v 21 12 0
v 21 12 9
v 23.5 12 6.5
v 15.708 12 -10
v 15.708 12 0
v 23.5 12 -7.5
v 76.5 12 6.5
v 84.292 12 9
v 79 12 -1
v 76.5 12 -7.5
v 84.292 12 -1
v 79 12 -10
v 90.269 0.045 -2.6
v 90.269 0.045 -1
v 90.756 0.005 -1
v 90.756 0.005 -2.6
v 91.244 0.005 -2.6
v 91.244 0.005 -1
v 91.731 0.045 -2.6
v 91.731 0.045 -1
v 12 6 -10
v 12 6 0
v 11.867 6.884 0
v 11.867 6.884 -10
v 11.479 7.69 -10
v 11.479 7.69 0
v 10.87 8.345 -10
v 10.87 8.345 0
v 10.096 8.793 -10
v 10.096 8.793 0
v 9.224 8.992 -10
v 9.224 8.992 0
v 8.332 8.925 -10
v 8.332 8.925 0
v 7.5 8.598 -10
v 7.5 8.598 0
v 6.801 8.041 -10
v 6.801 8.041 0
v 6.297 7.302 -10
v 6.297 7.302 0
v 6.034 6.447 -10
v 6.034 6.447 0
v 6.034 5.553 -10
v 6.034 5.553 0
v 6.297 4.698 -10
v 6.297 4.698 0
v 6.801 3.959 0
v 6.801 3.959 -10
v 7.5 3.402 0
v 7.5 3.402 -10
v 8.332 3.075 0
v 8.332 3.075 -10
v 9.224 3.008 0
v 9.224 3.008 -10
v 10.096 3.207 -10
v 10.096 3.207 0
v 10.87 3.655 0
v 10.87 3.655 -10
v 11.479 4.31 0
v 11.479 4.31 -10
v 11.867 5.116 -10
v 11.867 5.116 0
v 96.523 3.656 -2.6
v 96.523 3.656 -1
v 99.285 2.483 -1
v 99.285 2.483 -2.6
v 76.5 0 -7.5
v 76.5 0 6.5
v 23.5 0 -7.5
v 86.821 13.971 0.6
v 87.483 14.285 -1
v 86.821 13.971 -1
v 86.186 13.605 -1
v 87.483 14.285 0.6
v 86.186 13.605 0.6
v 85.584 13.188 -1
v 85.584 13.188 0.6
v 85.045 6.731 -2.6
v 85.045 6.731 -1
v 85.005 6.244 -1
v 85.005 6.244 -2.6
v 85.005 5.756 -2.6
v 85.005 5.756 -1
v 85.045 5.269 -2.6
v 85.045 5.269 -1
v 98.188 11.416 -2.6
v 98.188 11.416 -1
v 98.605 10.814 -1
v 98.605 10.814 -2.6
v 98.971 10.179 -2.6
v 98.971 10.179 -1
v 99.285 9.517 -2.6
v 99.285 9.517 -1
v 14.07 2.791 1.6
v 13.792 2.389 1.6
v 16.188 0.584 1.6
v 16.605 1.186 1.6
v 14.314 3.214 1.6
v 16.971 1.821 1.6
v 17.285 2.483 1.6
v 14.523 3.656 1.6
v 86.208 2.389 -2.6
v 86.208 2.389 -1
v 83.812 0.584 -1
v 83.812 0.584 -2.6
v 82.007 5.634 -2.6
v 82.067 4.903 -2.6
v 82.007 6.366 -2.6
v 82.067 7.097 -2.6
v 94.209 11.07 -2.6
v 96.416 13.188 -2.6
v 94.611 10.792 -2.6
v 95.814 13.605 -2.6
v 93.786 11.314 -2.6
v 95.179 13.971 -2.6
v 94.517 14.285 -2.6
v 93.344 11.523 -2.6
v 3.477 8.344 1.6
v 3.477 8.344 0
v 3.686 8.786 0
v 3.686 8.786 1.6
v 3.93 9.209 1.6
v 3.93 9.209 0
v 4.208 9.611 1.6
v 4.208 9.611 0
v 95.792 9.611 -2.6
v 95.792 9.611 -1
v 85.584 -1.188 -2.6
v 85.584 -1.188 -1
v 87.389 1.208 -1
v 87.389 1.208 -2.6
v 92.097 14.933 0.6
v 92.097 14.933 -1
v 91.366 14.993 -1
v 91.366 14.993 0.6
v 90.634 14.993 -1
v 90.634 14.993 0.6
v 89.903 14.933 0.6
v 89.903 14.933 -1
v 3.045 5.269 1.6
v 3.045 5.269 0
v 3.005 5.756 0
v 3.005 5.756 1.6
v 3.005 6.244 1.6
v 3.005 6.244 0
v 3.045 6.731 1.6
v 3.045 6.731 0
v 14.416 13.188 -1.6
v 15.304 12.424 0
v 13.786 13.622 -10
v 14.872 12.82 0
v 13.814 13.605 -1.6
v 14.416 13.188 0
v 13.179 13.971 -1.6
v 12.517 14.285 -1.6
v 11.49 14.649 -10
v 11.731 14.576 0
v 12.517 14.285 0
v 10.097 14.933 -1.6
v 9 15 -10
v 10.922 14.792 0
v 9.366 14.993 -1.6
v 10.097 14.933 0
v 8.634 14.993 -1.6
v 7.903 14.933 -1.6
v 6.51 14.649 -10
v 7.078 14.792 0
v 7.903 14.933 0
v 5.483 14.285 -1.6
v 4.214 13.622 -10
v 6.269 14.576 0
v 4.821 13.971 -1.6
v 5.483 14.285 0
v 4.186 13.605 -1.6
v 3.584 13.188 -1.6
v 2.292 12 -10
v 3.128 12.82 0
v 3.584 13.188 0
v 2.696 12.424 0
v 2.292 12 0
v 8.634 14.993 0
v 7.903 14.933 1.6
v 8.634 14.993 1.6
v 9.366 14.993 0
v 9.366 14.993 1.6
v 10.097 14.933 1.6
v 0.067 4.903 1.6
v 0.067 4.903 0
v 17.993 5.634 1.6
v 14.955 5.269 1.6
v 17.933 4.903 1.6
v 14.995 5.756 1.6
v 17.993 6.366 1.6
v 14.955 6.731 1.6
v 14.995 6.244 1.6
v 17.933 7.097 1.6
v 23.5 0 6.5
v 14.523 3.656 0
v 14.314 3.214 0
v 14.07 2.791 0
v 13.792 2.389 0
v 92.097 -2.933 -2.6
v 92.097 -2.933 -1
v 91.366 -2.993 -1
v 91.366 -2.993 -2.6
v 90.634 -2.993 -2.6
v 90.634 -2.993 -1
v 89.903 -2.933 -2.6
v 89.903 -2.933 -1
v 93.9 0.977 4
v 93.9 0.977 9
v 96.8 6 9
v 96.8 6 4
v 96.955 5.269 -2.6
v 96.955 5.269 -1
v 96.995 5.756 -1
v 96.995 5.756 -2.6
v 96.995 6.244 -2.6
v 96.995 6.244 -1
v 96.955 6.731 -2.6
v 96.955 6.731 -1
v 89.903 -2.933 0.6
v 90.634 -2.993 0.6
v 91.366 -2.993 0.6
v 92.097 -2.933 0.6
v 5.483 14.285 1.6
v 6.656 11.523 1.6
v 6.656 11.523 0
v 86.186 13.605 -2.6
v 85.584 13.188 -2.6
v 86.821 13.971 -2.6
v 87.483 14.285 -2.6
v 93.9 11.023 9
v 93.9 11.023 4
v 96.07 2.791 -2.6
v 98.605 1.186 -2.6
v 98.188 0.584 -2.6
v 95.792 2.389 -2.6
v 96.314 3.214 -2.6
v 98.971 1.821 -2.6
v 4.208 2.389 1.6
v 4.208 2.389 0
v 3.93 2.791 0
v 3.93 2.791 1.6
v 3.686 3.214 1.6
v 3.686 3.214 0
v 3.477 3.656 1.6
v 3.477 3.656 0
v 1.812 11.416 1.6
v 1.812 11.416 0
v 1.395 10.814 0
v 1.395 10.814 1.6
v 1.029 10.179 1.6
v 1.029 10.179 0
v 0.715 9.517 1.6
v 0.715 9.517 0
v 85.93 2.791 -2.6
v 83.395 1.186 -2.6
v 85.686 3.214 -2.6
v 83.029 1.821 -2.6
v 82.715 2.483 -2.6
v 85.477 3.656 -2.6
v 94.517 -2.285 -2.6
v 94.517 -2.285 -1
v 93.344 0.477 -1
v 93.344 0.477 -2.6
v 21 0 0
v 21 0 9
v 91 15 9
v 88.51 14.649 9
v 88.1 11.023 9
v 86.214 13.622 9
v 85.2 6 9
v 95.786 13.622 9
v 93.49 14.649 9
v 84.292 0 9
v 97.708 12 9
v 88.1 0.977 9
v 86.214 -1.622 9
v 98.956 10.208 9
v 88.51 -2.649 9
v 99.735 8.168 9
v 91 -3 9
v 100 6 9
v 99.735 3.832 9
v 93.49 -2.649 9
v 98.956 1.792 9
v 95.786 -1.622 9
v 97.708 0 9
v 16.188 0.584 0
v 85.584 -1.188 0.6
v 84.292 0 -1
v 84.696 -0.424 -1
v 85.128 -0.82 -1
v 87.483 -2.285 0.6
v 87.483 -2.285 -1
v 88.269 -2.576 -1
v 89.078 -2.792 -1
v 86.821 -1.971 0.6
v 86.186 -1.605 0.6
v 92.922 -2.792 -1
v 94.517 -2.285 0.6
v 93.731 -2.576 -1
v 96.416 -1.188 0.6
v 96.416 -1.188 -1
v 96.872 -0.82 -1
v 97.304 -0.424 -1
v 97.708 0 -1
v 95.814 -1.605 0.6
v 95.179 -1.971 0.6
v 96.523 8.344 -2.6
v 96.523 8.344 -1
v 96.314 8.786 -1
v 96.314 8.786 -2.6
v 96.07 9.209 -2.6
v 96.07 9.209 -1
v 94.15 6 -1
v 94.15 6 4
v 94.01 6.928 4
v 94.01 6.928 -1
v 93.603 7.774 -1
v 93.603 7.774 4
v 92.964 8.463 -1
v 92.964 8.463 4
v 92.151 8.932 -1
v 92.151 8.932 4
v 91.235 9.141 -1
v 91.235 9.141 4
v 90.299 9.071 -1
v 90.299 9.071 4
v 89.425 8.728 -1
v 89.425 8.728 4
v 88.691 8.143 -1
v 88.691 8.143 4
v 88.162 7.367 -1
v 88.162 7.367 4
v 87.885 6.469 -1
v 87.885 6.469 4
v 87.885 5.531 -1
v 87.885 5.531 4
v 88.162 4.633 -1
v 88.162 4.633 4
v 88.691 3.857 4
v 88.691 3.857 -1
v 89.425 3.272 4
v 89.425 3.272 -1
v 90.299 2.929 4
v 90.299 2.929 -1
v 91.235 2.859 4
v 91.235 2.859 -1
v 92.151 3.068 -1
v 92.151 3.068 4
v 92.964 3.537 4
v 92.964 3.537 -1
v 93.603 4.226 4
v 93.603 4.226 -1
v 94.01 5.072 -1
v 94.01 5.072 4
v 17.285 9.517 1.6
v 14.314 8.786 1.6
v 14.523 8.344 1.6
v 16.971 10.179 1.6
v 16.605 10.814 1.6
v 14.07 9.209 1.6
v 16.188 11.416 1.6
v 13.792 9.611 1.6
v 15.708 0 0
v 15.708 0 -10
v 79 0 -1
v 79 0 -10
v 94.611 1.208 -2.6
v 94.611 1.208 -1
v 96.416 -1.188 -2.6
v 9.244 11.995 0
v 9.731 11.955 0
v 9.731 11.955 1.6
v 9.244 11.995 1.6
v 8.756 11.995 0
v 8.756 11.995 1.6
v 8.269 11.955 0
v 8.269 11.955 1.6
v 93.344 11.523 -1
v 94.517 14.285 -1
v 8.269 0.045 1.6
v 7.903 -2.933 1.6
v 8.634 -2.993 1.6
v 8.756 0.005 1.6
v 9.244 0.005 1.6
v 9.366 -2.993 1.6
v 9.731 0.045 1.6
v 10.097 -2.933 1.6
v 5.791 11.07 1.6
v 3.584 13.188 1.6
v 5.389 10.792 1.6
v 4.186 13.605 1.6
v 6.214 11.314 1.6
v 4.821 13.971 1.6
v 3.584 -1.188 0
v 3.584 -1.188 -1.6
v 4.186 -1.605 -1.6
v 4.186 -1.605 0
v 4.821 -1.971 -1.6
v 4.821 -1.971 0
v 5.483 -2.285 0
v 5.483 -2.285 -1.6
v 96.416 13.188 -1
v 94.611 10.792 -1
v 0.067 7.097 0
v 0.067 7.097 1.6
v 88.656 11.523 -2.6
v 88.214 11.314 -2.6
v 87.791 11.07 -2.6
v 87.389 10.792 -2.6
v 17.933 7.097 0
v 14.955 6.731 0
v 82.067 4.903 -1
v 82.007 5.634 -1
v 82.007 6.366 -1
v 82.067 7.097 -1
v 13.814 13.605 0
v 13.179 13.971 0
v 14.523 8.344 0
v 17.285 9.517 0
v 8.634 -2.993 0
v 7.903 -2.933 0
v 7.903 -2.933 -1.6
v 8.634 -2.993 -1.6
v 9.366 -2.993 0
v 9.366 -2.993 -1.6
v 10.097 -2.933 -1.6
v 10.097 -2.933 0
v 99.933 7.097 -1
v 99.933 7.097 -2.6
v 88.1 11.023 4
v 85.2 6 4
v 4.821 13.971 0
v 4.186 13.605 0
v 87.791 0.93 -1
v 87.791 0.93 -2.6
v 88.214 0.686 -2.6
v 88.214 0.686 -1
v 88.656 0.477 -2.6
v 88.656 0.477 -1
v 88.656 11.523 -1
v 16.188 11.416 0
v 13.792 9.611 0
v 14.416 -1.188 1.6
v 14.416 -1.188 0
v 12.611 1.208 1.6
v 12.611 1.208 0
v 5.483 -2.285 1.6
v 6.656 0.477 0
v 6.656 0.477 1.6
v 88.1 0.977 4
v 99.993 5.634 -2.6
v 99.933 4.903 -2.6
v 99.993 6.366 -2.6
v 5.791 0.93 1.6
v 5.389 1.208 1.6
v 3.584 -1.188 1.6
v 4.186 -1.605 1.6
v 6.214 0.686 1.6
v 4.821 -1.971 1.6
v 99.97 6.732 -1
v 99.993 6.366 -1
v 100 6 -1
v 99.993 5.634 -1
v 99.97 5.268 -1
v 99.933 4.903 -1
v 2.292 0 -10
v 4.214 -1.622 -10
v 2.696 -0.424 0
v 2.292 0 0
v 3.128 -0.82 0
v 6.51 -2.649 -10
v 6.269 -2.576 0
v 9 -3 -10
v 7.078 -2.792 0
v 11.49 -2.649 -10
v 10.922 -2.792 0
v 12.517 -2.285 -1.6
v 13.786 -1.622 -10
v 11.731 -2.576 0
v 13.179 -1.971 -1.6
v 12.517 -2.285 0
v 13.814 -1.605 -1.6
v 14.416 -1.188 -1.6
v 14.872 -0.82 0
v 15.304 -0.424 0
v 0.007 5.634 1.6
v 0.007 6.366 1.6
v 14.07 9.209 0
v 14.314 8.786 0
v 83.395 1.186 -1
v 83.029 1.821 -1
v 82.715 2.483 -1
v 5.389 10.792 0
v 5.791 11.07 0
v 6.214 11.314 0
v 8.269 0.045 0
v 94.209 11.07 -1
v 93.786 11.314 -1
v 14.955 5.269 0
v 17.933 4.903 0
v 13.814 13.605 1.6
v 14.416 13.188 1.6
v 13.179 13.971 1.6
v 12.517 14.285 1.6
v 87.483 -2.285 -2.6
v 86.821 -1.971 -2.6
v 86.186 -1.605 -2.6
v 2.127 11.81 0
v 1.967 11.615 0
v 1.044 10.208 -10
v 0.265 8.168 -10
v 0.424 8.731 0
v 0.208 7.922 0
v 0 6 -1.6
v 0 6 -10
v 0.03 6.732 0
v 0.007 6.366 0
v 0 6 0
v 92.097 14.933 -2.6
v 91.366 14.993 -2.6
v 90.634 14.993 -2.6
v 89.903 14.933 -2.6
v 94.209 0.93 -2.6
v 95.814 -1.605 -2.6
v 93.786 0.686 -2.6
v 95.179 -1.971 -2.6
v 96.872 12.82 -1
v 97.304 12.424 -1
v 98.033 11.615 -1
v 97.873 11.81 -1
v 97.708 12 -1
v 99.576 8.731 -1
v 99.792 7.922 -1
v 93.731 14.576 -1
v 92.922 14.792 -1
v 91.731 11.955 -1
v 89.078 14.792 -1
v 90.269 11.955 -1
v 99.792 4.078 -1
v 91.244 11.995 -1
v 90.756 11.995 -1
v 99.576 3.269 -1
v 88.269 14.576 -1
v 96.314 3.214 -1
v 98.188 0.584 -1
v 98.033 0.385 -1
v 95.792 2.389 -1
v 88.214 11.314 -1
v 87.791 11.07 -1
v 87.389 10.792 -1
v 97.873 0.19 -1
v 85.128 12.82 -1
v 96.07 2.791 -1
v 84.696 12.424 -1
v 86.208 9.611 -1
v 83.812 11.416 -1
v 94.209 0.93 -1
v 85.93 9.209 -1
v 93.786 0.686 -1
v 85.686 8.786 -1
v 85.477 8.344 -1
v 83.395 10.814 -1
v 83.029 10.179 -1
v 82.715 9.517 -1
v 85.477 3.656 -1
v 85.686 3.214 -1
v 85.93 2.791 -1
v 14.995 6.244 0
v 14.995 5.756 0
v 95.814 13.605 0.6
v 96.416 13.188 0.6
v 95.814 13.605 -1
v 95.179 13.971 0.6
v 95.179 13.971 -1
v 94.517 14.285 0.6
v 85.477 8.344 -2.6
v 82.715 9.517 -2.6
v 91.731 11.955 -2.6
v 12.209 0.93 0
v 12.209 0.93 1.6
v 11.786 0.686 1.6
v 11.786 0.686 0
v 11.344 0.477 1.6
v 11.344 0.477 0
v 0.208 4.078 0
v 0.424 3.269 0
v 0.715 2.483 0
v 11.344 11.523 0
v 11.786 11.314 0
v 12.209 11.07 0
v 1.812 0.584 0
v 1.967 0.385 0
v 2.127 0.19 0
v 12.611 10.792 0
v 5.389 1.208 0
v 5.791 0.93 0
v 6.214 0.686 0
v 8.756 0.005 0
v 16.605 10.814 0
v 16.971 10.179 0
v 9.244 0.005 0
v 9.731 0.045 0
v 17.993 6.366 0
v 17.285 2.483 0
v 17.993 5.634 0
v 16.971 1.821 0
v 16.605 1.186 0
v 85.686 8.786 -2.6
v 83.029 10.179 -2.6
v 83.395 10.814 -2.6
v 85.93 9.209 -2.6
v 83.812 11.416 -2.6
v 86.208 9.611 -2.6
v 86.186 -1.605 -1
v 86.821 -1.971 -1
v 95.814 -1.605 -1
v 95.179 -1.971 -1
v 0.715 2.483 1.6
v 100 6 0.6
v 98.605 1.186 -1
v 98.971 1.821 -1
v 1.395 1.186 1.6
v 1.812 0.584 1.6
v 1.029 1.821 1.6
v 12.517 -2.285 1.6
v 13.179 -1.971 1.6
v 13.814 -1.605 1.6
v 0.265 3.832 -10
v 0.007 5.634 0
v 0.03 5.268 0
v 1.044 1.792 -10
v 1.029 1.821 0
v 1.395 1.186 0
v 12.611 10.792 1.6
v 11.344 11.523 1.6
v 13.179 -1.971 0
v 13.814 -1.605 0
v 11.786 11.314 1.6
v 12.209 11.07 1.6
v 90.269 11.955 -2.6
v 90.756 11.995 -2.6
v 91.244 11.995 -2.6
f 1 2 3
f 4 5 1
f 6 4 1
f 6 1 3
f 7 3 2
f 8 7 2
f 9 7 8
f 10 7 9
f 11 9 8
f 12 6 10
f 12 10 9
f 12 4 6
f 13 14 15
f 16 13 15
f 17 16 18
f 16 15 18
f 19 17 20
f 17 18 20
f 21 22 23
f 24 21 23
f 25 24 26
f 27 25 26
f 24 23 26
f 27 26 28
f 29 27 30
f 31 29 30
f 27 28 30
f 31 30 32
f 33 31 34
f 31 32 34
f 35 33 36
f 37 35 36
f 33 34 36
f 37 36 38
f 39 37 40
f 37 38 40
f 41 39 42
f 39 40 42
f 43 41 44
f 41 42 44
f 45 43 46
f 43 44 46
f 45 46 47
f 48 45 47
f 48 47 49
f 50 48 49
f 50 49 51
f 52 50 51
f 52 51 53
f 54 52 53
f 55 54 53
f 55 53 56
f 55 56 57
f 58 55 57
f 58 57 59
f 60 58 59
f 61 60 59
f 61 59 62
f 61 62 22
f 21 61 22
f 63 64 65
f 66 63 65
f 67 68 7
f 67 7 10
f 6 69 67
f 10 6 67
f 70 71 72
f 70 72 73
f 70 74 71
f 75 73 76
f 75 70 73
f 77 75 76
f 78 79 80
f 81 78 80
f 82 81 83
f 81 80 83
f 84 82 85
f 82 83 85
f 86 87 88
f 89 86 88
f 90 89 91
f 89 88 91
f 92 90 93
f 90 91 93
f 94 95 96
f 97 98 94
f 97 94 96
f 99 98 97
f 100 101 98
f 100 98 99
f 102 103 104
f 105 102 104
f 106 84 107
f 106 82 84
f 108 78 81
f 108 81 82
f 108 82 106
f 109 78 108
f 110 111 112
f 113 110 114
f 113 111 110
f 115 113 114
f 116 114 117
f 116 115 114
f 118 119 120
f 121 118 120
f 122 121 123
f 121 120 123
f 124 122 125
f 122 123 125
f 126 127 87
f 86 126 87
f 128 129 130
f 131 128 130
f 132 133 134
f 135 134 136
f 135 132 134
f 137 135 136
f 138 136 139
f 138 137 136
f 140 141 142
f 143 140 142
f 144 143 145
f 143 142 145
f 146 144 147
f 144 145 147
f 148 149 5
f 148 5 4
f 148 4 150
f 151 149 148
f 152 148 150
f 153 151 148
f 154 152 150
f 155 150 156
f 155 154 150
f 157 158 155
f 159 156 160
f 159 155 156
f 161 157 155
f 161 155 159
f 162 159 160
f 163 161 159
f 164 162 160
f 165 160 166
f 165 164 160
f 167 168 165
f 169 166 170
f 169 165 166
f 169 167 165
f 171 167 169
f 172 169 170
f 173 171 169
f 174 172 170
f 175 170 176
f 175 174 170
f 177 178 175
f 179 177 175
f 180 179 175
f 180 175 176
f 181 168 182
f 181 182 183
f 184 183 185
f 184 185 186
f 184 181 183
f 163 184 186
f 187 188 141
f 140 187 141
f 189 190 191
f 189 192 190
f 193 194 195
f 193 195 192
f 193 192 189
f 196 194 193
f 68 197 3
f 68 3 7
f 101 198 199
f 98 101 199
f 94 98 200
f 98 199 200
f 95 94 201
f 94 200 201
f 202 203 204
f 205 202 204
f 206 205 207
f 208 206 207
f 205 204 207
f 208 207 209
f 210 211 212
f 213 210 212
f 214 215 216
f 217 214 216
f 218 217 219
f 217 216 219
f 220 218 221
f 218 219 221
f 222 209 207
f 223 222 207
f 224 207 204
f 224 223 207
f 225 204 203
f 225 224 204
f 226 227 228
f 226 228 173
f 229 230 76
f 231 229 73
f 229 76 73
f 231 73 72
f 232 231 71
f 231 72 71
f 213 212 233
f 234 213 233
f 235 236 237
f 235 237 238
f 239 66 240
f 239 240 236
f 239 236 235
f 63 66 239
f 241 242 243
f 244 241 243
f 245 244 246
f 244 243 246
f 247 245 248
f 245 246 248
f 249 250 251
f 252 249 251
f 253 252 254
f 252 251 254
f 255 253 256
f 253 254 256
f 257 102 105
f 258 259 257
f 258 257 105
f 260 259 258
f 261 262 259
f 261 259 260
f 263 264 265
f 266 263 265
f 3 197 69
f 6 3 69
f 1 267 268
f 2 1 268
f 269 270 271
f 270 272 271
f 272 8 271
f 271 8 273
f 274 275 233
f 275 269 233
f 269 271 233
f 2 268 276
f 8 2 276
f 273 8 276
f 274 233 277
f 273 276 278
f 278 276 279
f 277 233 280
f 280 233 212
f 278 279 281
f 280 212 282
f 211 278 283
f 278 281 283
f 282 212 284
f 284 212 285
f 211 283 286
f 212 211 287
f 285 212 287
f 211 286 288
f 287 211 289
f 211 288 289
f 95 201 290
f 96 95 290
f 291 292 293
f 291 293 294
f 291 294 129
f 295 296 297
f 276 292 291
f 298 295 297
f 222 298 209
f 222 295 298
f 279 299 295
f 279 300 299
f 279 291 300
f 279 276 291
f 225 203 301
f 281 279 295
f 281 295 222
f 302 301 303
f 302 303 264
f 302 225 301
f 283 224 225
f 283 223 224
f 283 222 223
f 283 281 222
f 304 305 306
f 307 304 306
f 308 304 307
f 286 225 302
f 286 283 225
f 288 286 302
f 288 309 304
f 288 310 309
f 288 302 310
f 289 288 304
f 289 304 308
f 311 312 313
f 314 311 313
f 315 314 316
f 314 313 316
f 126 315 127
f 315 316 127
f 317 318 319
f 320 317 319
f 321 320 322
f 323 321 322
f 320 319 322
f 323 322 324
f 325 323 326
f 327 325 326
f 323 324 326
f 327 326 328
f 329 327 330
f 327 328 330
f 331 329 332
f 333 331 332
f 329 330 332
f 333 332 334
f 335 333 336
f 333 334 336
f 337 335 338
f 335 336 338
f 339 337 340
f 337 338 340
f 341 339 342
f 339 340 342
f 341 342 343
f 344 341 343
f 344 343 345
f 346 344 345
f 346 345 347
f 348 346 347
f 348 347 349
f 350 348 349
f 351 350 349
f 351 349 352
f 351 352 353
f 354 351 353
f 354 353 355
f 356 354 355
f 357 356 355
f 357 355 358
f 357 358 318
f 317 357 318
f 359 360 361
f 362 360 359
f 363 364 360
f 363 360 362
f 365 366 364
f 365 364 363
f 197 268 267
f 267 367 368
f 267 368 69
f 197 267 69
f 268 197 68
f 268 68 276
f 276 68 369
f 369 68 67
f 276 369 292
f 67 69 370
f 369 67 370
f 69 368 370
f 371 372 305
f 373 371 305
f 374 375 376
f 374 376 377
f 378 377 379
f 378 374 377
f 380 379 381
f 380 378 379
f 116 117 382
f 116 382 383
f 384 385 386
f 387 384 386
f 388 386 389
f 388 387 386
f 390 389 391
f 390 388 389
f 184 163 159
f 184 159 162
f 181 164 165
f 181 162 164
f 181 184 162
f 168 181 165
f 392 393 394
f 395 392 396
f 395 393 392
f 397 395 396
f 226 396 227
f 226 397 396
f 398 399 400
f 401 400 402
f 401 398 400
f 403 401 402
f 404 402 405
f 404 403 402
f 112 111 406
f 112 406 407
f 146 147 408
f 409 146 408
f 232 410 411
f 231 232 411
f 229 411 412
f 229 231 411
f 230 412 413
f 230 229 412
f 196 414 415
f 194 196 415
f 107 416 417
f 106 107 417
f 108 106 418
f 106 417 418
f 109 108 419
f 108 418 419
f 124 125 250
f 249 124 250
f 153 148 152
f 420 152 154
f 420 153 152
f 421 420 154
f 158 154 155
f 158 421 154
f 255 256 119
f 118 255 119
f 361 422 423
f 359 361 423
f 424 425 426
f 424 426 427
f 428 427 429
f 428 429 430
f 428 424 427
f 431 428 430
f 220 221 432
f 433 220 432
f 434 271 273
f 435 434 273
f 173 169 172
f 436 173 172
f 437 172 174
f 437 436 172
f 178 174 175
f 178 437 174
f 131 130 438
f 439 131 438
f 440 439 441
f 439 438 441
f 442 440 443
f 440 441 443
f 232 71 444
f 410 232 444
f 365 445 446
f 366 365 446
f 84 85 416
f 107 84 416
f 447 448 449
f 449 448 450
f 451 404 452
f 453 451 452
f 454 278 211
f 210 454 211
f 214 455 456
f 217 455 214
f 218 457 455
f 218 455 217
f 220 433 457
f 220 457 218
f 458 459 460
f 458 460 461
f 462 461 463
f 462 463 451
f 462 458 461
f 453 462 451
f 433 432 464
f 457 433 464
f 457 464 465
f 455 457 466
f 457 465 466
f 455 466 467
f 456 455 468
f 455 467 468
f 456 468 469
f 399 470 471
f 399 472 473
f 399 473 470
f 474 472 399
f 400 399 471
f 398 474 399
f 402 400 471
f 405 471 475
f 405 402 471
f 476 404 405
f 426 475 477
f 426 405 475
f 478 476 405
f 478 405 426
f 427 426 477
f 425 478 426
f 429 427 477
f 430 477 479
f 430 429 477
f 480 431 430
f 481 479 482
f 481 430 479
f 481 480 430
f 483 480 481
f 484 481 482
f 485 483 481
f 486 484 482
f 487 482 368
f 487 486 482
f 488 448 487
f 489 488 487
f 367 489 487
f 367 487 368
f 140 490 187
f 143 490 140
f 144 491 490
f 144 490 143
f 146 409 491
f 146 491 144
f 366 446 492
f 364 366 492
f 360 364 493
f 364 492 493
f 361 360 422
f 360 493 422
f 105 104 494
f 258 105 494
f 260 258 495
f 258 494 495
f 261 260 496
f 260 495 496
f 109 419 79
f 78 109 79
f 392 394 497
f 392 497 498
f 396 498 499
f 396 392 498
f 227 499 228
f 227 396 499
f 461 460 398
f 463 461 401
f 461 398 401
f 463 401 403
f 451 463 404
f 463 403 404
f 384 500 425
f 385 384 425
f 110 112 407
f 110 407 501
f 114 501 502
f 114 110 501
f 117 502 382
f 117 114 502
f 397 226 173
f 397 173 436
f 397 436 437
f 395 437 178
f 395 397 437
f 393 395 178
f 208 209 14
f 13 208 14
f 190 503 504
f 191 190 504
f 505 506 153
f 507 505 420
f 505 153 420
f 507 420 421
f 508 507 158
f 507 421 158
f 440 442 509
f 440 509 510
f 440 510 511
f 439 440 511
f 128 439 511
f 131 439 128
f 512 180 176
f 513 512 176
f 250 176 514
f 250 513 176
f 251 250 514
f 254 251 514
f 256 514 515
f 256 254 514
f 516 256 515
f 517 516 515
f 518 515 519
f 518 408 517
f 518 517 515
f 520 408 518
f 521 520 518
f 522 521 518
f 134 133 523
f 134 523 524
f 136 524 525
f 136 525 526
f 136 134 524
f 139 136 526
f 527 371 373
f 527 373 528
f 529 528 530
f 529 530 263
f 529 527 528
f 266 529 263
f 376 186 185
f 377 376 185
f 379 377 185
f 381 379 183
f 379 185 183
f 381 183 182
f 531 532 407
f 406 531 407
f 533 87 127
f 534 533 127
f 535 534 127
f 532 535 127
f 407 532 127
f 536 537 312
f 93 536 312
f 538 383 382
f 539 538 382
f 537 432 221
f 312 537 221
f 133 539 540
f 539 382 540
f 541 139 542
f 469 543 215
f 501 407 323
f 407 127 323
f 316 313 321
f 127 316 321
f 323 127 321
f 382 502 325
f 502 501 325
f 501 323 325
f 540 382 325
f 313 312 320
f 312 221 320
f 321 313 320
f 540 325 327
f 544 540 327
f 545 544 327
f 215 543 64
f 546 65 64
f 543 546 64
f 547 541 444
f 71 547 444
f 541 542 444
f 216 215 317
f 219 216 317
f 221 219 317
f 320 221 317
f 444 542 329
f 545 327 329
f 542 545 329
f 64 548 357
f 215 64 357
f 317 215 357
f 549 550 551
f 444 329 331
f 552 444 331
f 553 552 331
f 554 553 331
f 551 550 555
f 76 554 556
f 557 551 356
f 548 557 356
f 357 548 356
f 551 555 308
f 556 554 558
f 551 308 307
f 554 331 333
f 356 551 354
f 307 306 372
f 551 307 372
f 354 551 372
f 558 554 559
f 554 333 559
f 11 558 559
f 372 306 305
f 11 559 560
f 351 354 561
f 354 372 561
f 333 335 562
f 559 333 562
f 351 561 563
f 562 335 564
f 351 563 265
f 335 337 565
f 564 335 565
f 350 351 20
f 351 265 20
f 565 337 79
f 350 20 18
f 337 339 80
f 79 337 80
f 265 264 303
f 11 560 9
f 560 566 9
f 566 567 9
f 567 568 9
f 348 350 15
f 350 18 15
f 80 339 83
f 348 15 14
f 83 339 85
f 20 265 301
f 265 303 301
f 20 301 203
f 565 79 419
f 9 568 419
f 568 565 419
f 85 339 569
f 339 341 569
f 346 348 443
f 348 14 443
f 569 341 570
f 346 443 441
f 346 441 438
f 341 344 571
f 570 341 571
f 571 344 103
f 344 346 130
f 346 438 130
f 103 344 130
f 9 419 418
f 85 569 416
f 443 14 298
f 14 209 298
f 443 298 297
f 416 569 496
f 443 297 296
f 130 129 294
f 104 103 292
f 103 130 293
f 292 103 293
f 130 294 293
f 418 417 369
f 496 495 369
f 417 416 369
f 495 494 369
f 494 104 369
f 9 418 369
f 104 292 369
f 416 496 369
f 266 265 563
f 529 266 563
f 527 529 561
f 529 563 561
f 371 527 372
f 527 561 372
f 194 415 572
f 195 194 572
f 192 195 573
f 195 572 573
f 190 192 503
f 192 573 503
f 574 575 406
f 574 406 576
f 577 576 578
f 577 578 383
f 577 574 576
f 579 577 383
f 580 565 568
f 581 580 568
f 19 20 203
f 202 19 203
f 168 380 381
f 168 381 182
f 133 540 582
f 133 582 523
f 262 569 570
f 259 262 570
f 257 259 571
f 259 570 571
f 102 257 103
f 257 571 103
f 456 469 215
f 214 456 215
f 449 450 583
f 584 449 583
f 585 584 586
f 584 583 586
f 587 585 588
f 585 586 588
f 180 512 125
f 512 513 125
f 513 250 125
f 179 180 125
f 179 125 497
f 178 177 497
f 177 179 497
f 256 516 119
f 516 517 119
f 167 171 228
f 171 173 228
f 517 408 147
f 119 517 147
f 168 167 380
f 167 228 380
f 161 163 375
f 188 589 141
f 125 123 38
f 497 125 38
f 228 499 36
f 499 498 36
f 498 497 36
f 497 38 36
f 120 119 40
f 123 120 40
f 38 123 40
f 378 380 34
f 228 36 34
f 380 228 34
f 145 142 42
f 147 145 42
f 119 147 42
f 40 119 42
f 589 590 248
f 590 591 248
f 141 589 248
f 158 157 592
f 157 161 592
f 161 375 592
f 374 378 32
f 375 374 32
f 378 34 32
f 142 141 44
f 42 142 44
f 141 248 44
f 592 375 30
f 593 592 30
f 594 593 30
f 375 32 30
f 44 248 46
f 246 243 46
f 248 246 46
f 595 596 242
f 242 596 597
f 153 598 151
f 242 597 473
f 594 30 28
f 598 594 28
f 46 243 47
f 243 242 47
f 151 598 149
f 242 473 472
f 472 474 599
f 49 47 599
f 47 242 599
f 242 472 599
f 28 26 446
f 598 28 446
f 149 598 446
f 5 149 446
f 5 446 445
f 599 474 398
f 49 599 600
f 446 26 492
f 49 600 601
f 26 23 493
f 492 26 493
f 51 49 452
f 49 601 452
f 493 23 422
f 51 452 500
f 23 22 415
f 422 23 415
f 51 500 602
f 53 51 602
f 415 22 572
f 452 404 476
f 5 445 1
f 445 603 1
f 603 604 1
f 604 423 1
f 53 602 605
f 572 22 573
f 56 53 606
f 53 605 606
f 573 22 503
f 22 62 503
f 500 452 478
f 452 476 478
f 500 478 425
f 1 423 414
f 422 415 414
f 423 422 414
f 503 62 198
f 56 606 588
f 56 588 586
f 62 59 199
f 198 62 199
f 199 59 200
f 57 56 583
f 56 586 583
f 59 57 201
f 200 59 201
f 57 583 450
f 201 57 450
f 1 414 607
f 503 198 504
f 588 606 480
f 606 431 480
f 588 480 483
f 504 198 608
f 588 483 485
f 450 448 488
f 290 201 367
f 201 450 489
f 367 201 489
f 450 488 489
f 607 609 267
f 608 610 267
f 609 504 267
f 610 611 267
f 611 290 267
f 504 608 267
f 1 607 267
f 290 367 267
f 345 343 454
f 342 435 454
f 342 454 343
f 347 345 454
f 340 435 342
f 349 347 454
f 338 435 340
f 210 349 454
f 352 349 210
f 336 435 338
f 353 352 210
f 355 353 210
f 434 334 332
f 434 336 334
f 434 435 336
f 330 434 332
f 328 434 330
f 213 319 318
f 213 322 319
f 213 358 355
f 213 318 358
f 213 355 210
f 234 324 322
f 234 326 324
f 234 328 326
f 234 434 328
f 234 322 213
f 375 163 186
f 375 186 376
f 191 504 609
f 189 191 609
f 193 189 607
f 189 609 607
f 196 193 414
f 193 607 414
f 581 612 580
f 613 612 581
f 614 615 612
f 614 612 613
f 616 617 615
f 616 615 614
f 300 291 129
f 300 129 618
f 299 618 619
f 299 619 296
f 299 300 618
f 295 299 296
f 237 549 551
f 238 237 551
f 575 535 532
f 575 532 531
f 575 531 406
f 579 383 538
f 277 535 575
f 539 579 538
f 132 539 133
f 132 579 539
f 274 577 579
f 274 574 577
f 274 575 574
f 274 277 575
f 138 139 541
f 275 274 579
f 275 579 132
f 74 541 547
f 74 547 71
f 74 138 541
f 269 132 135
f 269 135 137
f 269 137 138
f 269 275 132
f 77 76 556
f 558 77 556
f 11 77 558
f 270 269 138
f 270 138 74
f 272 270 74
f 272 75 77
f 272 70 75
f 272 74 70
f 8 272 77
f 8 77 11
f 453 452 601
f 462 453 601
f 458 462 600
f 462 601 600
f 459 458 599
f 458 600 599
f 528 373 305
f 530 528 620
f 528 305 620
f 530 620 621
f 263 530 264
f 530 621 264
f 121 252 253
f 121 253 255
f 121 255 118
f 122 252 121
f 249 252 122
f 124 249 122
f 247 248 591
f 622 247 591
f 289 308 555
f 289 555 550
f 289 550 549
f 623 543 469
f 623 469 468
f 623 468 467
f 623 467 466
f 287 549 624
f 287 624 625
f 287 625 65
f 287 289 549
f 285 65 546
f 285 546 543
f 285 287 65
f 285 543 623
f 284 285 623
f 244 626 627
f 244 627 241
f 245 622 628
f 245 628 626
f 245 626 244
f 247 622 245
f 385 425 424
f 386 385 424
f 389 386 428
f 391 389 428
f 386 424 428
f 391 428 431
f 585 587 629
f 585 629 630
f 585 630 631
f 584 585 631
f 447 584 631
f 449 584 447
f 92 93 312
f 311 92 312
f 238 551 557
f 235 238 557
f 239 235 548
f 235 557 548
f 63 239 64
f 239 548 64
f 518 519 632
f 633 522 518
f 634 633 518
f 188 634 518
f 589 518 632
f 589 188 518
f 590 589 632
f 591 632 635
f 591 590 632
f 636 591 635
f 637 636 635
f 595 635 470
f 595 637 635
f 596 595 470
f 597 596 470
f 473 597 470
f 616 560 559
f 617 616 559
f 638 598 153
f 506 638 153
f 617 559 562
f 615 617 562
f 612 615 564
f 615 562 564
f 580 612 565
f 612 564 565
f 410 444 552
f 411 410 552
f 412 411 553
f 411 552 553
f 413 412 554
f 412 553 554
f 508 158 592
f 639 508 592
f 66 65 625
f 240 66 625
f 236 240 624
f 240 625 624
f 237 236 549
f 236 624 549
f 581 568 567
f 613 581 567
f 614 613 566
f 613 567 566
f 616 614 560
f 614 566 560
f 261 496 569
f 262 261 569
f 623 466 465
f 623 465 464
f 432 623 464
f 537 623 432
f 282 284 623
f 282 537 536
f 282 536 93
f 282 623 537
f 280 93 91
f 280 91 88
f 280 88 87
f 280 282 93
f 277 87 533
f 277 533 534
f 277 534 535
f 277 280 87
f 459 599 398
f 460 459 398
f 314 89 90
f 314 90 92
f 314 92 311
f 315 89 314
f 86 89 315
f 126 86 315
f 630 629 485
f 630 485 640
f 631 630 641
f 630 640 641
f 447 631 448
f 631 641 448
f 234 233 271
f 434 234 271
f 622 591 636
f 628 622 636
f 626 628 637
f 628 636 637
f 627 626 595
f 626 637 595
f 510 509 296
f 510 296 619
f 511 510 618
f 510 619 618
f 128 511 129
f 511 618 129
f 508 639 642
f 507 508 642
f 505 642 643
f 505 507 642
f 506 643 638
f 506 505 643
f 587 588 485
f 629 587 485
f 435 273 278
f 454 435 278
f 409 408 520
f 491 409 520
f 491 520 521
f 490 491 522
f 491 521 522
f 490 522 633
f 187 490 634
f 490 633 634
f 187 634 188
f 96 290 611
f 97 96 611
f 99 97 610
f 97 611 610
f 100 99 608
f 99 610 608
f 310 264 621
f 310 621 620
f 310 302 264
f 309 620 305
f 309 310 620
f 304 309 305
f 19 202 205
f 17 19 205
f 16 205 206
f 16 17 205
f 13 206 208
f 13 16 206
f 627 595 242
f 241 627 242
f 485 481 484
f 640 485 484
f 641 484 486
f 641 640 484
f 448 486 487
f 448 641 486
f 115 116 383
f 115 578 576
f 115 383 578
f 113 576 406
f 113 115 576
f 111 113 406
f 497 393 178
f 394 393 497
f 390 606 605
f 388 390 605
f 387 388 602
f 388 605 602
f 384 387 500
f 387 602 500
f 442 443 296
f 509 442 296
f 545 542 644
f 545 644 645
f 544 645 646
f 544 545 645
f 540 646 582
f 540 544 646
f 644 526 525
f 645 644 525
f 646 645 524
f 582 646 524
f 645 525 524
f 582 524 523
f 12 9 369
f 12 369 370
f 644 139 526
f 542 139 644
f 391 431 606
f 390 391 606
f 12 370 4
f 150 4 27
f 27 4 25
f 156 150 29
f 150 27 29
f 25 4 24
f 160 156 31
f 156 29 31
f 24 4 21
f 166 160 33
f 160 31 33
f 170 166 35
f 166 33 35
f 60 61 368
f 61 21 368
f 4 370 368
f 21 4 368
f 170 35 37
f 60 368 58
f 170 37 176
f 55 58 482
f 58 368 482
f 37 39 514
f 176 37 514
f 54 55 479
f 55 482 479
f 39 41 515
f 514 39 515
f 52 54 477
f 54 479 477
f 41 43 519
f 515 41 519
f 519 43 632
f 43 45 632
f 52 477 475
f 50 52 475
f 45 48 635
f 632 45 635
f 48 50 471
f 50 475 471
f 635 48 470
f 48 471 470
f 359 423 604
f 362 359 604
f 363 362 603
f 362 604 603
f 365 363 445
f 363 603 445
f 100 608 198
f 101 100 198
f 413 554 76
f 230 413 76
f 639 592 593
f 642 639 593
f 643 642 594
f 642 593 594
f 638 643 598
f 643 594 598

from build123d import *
from build123d.topology import SkipClean

# Parameters (mm, degrees)
CROQUIS1_W              = 53
CROQUIS1_H              = 14
SALIENTE_EXTRUIR1_DEPTH = 12
CROQUIS2_R              = 9
SALIENTE_EXTRUIR2_DEPTH = 10
CORTAR_EXTRUIR3_DEPTH   = 5
CROQUIS5_R              = 3.15
CORTAR_EXTRUIR4_DEPTH   = 10
CROQUIS6_R              = 9
SALIENTE_EXTRUIR3_DEPTH = 10
CROQUIS3_R              = 3
CORTAR_EXTRUIR5_DEPTH   = 30
SALIENTE_EXTRUIR4_DEPTH = 1.6
SALIENTE_EXTRUIR5_DEPTH = 1.6
CORTAR_EXTRUIR6_START   = -10
CORTAR_EXTRUIR6_DEPTH   = 10
CORTAR_EXTRUIR7_START   = -10
CORTAR_EXTRUIR7_DEPTH   = 10


# Read off the part's stored shape, not the designer's step: Cortar-Extruir6, Cortar-Extruir7
with BuildPart() as part:
    # Croquis1 → Saliente-Extruir1 (new body)
    with BuildSketch(Plane(origin=(0, 0, 0), x_dir=(1, 0, 0), z_dir=(0, 1, 0))):
        Polygon((0, 0), (21, 0), (21, -9), (100, -9), (100, 1), (79, 1), (79, 10), (0, 10), align=None)
        with Locations((50, 0.5)):
            Rectangle(CROQUIS1_W, CROQUIS1_H, mode=Mode.SUBTRACT)
    extrude(amount=SALIENTE_EXTRUIR1_DEPTH)

    # Croquis2 → Saliente-Extruir2 (add)
    with BuildSketch(Plane.XY):
        with Locations((9, 6)):
            Circle(CROQUIS2_R)
    extrude(amount=-SALIENTE_EXTRUIR2_DEPTH)

    # Croquis4 → Cortar-Extruir3 (cut)
    with BuildSketch(Plane.XY.offset(9)):
        Polygon((96.8, 6), (93.9, 11.022947342), (88.1, 11.022947342), (85.2, 6), (88.1, 0.977052658), (93.9, 0.977052658), align=None)
    extrude(amount=-CORTAR_EXTRUIR3_DEPTH, mode=Mode.SUBTRACT)

    # Croquis5 → Cortar-Extruir4 (cut)
    with BuildSketch(Plane.XY.offset(4)):
        with Locations((91, 6)):
            Circle(CROQUIS5_R)
    extrude(amount=-CORTAR_EXTRUIR4_DEPTH, mode=Mode.SUBTRACT)

    # Croquis6 → Saliente-Extruir3 (add)
    with BuildSketch(Plane.XY.offset(9)):
        with Locations((91, 6)):
            Circle(CROQUIS6_R)
        Polygon((96.8, 6), (93.9, 11.022947342), (88.1, 11.022947342), (85.2, 6), (88.1, 0.977052658), (93.9, 0.977052658), align=None, mode=Mode.SUBTRACT)
    extrude(amount=-SALIENTE_EXTRUIR3_DEPTH)

    # Croquis3 → Cortar-Extruir5 (cut)
    with BuildSketch(Plane.XY):
        with Locations((9, 6)):
            Circle(CROQUIS3_R)
    extrude(amount=-CORTAR_EXTRUIR5_DEPTH, mode=Mode.SUBTRACT)

    # Croquis7 → Saliente-Extruir4 (add, symmetric)
    with SkipClean():  # the faces are left unmerged after this step: merging them gives an invalid solid
        with BuildSketch(Plane.XY):
            with BuildLine():
                Line((8.26878394, 11.95527691), (7.903175909, 14.932915365))
                ThreePointArc((7.903175909, 14.932915365), (9, 15), (10.096824091, 14.932915365))
                Line((10.096824091, 14.932915365), (9.73121606, 11.95527691))
                ThreePointArc((9.73121606, 11.95527691), (9, 12), (8.26878394, 11.95527691))
            make_face()
            with BuildLine():
                Line((12.610890139, 10.79181306), (14.416335208, 13.18771959))
                ThreePointArc((14.416335208, 13.18771959), (13.5, 13.794228634), (12.516580156, 14.284543681))
                Line((12.516580156, 14.284543681), (11.344386771, 11.523029121))
                ThreePointArc((11.344386771, 11.523029121), (12, 11.196152423), (12.610890139, 10.79181306))
            make_face()
            with BuildLine():
                Line((14.523029121, 8.344386771), (17.284543681, 9.516580156))
                ThreePointArc((17.284543681, 9.516580156), (16.794228634, 10.5), (16.18771959, 11.416335208))
                Line((16.18771959, 11.416335208), (13.79181306, 9.610890139))
                ThreePointArc((13.79181306, 9.610890139), (14.196152423, 9), (14.523029121, 8.344386771))
            make_face()
            with BuildLine():
                Line((14.95527691, 5.26878394), (17.932915365, 4.903175909))
                ThreePointArc((17.932915365, 4.903175909), (18, 6), (17.932915365, 7.096824091))
                Line((17.932915365, 7.096824091), (14.95527691, 6.73121606))
                ThreePointArc((14.95527691, 6.73121606), (15, 6), (14.95527691, 5.26878394))
            make_face()
            with BuildLine():
                Line((13.79181306, 2.389109861), (16.18771959, 0.583664792))
                ThreePointArc((16.18771959, 0.583664792), (16.794228634, 1.5), (17.284543681, 2.483419844))
                Line((17.284543681, 2.483419844), (14.523029121, 3.655613229))
                ThreePointArc((14.523029121, 3.655613229), (14.196152423, 3), (13.79181306, 2.389109861))
            make_face()
            with BuildLine():
                Line((11.344386771, 0.476970879), (12.516580156, -2.284543681))
                ThreePointArc((12.516580156, -2.284543681), (13.5, -1.794228634), (14.416335208, -1.18771959))
                Line((14.416335208, -1.18771959), (12.610890139, 1.20818694))
                ThreePointArc((12.610890139, 1.20818694), (12, 0.803847577), (11.344386771, 0.476970879))
            make_face()
            with BuildLine():
                Line((8.26878394, 0.04472309), (7.903175909, -2.932915365))
                ThreePointArc((7.903175909, -2.932915365), (9, -3), (10.096824091, -2.932915365))
                Line((10.096824091, -2.932915365), (9.73121606, 0.04472309))
                ThreePointArc((9.73121606, 0.04472309), (9, 0), (8.26878394, 0.04472309))
            make_face()
            with BuildLine():
                Line((5.389109861, 1.20818694), (3.583664792, -1.18771959))
                ThreePointArc((3.583664792, -1.18771959), (4.5, -1.794228634), (5.483419844, -2.284543681))
                Line((5.483419844, -2.284543681), (6.655613229, 0.476970879))
                ThreePointArc((6.655613229, 0.476970879), (6, 0.803847577), (5.389109861, 1.20818694))
            make_face()
            with BuildLine():
                Line((3.476970879, 3.655613229), (0.715456319, 2.483419844))
                ThreePointArc((0.715456319, 2.483419844), (1.205771366, 1.5), (1.81228041, 0.583664792))
                Line((1.81228041, 0.583664792), (4.20818694, 2.389109861))
                ThreePointArc((4.20818694, 2.389109861), (3.803847577, 3), (3.476970879, 3.655613229))
            make_face()
            with BuildLine():
                Line((3.04472309, 6.73121606), (0.067084635, 7.096824091))
                ThreePointArc((0.067084635, 7.096824091), (0, 6), (0.067084635, 4.903175909))
                Line((0.067084635, 4.903175909), (3.04472309, 5.26878394))
                ThreePointArc((3.04472309, 5.26878394), (3, 6), (3.04472309, 6.73121606))
            make_face()
            with BuildLine():
                Line((4.20818694, 9.610890139), (1.81228041, 11.416335208))
                ThreePointArc((1.81228041, 11.416335208), (1.205771366, 10.5), (0.715456319, 9.516580156))
                Line((0.715456319, 9.516580156), (3.476970879, 8.344386771))
                ThreePointArc((3.476970879, 8.344386771), (3.803847577, 9), (4.20818694, 9.610890139))
            make_face()
            with BuildLine():
                Line((6.655613229, 11.523029121), (5.483419844, 14.284543681))
                ThreePointArc((5.483419844, 14.284543681), (4.5, 13.794228634), (3.583664792, 13.18771959))
                Line((3.583664792, 13.18771959), (5.389109861, 10.79181306))
                ThreePointArc((5.389109861, 10.79181306), (6, 11.196152423), (6.655613229, 11.523029121))
            make_face()
        extrude(amount=SALIENTE_EXTRUIR4_DEPTH, both=True)

    # Croquis8 → Saliente-Extruir5 (add, symmetric)
    with SkipClean():  # the faces are left unmerged after this step: merging them gives an invalid solid
        with BuildSketch(Plane(origin=(0, 0, -1), x_dir=(-1, 0, 0), z_dir=(0, 0, -1))):
            with BuildLine():
                Line((-91.73121606, 11.95527691), (-92.096824091, 14.932915365))
                ThreePointArc((-92.096824091, 14.932915365), (-91, 15), (-89.903175909, 14.932915365))
                Line((-89.903175909, 14.932915365), (-90.26878394, 11.95527691))
                ThreePointArc((-90.26878394, 11.95527691), (-91, 12), (-91.73121606, 11.95527691))
            make_face()
            with BuildLine():
                Line((-87.389109861, 10.79181306), (-85.583664792, 13.18771959))
                ThreePointArc((-85.583664792, 13.18771959), (-86.5, 13.794228634), (-87.483419844, 14.284543681))
                Line((-87.483419844, 14.284543681), (-88.655613229, 11.523029121))
                ThreePointArc((-88.655613229, 11.523029121), (-88, 11.196152423), (-87.389109861, 10.79181306))
            make_face()
            with BuildLine():
                Line((-85.476970879, 8.344386771), (-82.715456319, 9.516580156))
                ThreePointArc((-82.715456319, 9.516580156), (-83.205771366, 10.5), (-83.81228041, 11.416335208))
                Line((-83.81228041, 11.416335208), (-86.20818694, 9.610890139))
                ThreePointArc((-86.20818694, 9.610890139), (-85.803847577, 9), (-85.476970879, 8.344386771))
            make_face()
            with BuildLine():
                Line((-85.04472309, 5.26878394), (-82.067084635, 4.903175909))
                ThreePointArc((-82.067084635, 4.903175909), (-82, 6), (-82.067084635, 7.096824091))
                Line((-82.067084635, 7.096824091), (-85.04472309, 6.73121606))
                ThreePointArc((-85.04472309, 6.73121606), (-85, 6), (-85.04472309, 5.26878394))
            make_face()
            with BuildLine():
                Line((-86.20818694, 2.389109861), (-83.81228041, 0.583664792))
                ThreePointArc((-83.81228041, 0.583664792), (-83.205771366, 1.5), (-82.715456319, 2.483419844))
                Line((-82.715456319, 2.483419844), (-85.476970879, 3.655613229))
                ThreePointArc((-85.476970879, 3.655613229), (-85.803847577, 3), (-86.20818694, 2.389109861))
            make_face()
            with BuildLine():
                Line((-88.655613229, 0.476970879), (-87.483419844, -2.284543681))
                ThreePointArc((-87.483419844, -2.284543681), (-86.5, -1.794228634), (-85.583664792, -1.18771959))
                Line((-85.583664792, -1.18771959), (-87.389109861, 1.20818694))
                ThreePointArc((-87.389109861, 1.20818694), (-88, 0.803847577), (-88.655613229, 0.476970879))
            make_face()
            with BuildLine():
                Line((-91.73121606, 0.04472309), (-92.096824091, -2.932915365))
                ThreePointArc((-92.096824091, -2.932915365), (-91, -3), (-89.903175909, -2.932915365))
                Line((-89.903175909, -2.932915365), (-90.26878394, 0.04472309))
                ThreePointArc((-90.26878394, 0.04472309), (-91, 0), (-91.73121606, 0.04472309))
            make_face()
            with BuildLine():
                Line((-94.610890139, 1.20818694), (-96.416335208, -1.18771959))
                ThreePointArc((-96.416335208, -1.18771959), (-95.5, -1.794228634), (-94.516580156, -2.284543681))
                Line((-94.516580156, -2.284543681), (-93.344386771, 0.476970879))
                ThreePointArc((-93.344386771, 0.476970879), (-94, 0.803847577), (-94.610890139, 1.20818694))
            make_face()
            with BuildLine():
                Line((-96.523029121, 3.655613229), (-99.284543681, 2.483419844))
                ThreePointArc((-99.284543681, 2.483419844), (-98.794228634, 1.5), (-98.18771959, 0.583664792))
                Line((-98.18771959, 0.583664792), (-95.79181306, 2.389109861))
                ThreePointArc((-95.79181306, 2.389109861), (-96.196152423, 3), (-96.523029121, 3.655613229))
            make_face()
            with BuildLine():
                Line((-96.95527691, 6.73121606), (-99.932915365, 7.096824091))
                ThreePointArc((-99.932915365, 7.096824091), (-100, 6), (-99.932915365, 4.903175909))
                Line((-99.932915365, 4.903175909), (-96.95527691, 5.26878394))
                ThreePointArc((-96.95527691, 5.26878394), (-97, 6), (-96.95527691, 6.73121606))
            make_face()
            with BuildLine():
                Line((-95.79181306, 9.610890139), (-98.18771959, 11.416335208))
                ThreePointArc((-98.18771959, 11.416335208), (-98.794228634, 10.5), (-99.284543681, 9.516580156))
                Line((-99.284543681, 9.516580156), (-96.523029121, 8.344386771))
                ThreePointArc((-96.523029121, 8.344386771), (-96.196152423, 9), (-95.79181306, 9.610890139))
            make_face()
            with BuildLine():
                Line((-93.344386771, 11.523029121), (-94.516580156, 14.284543681))
                ThreePointArc((-94.516580156, 14.284543681), (-95.5, 13.794228634), (-96.416335208, 13.18771959))
                Line((-96.416335208, 13.18771959), (-94.610890139, 10.79181306))
                ThreePointArc((-94.610890139, 10.79181306), (-94, 11.196152423), (-93.344386771, 11.523029121))
            make_face()
        extrude(amount=SALIENTE_EXTRUIR5_DEPTH, both=True)

    # Cortar-Extruir6 outline → Cortar-Extruir6 (cut)
    with SkipClean():  # the faces are left unmerged after this step: merging them gives an invalid solid
        with BuildSketch(Plane(origin=(0, 0, -10), x_dir=(-1, 0, 0), z_dir=(0, 0, -1)).offset(CORTAR_EXTRUIR6_START)):
            with BuildLine():
                Line((0, 12), (-2.291796068, 12))
                ThreePointArc((-2.291796068, 12), (-0.59244875, 9.211398758), (0, 5.999999893))
                Line((0, 5.999999893), (0, 12))
            make_face()
            with BuildLine():
                Line((0, 0), (0, 5.999999893))
                ThreePointArc((0, 5.999999893), (-0.592448789, 2.788601142), (-2.291796068, 0))
                Line((-2.291796068, 0), (0, 0))
            make_face()
        extrude(amount=CORTAR_EXTRUIR6_DEPTH, mode=Mode.SUBTRACT)

    # Cortar-Extruir7 outline → Cortar-Extruir7 (cut)
    with SkipClean():  # the faces are left unmerged after this step: merging them gives an invalid solid
        with BuildSketch(Plane(origin=(0, 0, -1), x_dir=(-1, 0, 0), z_dir=(0, 0, -1)).offset(CORTAR_EXTRUIR7_START)):
            with BuildLine():
                Line((-100, 0), (-97.708203932, 0))
                ThreePointArc((-97.708203932, 0), (-99.407551231, 2.788601192), (-100, 6))
                Line((-100, 6), (-100, 0))
            make_face()
            with BuildLine():
                Line((-100, 12), (-100, 6))
                ThreePointArc((-100, 6), (-99.407551231, 9.211398808), (-97.708203932, 12))
                Line((-97.708203932, 12), (-100, 12))
            make_face()
        extrude(amount=CORTAR_EXTRUIR7_DEPTH, mode=Mode.SUBTRACT)


solid = part.part
